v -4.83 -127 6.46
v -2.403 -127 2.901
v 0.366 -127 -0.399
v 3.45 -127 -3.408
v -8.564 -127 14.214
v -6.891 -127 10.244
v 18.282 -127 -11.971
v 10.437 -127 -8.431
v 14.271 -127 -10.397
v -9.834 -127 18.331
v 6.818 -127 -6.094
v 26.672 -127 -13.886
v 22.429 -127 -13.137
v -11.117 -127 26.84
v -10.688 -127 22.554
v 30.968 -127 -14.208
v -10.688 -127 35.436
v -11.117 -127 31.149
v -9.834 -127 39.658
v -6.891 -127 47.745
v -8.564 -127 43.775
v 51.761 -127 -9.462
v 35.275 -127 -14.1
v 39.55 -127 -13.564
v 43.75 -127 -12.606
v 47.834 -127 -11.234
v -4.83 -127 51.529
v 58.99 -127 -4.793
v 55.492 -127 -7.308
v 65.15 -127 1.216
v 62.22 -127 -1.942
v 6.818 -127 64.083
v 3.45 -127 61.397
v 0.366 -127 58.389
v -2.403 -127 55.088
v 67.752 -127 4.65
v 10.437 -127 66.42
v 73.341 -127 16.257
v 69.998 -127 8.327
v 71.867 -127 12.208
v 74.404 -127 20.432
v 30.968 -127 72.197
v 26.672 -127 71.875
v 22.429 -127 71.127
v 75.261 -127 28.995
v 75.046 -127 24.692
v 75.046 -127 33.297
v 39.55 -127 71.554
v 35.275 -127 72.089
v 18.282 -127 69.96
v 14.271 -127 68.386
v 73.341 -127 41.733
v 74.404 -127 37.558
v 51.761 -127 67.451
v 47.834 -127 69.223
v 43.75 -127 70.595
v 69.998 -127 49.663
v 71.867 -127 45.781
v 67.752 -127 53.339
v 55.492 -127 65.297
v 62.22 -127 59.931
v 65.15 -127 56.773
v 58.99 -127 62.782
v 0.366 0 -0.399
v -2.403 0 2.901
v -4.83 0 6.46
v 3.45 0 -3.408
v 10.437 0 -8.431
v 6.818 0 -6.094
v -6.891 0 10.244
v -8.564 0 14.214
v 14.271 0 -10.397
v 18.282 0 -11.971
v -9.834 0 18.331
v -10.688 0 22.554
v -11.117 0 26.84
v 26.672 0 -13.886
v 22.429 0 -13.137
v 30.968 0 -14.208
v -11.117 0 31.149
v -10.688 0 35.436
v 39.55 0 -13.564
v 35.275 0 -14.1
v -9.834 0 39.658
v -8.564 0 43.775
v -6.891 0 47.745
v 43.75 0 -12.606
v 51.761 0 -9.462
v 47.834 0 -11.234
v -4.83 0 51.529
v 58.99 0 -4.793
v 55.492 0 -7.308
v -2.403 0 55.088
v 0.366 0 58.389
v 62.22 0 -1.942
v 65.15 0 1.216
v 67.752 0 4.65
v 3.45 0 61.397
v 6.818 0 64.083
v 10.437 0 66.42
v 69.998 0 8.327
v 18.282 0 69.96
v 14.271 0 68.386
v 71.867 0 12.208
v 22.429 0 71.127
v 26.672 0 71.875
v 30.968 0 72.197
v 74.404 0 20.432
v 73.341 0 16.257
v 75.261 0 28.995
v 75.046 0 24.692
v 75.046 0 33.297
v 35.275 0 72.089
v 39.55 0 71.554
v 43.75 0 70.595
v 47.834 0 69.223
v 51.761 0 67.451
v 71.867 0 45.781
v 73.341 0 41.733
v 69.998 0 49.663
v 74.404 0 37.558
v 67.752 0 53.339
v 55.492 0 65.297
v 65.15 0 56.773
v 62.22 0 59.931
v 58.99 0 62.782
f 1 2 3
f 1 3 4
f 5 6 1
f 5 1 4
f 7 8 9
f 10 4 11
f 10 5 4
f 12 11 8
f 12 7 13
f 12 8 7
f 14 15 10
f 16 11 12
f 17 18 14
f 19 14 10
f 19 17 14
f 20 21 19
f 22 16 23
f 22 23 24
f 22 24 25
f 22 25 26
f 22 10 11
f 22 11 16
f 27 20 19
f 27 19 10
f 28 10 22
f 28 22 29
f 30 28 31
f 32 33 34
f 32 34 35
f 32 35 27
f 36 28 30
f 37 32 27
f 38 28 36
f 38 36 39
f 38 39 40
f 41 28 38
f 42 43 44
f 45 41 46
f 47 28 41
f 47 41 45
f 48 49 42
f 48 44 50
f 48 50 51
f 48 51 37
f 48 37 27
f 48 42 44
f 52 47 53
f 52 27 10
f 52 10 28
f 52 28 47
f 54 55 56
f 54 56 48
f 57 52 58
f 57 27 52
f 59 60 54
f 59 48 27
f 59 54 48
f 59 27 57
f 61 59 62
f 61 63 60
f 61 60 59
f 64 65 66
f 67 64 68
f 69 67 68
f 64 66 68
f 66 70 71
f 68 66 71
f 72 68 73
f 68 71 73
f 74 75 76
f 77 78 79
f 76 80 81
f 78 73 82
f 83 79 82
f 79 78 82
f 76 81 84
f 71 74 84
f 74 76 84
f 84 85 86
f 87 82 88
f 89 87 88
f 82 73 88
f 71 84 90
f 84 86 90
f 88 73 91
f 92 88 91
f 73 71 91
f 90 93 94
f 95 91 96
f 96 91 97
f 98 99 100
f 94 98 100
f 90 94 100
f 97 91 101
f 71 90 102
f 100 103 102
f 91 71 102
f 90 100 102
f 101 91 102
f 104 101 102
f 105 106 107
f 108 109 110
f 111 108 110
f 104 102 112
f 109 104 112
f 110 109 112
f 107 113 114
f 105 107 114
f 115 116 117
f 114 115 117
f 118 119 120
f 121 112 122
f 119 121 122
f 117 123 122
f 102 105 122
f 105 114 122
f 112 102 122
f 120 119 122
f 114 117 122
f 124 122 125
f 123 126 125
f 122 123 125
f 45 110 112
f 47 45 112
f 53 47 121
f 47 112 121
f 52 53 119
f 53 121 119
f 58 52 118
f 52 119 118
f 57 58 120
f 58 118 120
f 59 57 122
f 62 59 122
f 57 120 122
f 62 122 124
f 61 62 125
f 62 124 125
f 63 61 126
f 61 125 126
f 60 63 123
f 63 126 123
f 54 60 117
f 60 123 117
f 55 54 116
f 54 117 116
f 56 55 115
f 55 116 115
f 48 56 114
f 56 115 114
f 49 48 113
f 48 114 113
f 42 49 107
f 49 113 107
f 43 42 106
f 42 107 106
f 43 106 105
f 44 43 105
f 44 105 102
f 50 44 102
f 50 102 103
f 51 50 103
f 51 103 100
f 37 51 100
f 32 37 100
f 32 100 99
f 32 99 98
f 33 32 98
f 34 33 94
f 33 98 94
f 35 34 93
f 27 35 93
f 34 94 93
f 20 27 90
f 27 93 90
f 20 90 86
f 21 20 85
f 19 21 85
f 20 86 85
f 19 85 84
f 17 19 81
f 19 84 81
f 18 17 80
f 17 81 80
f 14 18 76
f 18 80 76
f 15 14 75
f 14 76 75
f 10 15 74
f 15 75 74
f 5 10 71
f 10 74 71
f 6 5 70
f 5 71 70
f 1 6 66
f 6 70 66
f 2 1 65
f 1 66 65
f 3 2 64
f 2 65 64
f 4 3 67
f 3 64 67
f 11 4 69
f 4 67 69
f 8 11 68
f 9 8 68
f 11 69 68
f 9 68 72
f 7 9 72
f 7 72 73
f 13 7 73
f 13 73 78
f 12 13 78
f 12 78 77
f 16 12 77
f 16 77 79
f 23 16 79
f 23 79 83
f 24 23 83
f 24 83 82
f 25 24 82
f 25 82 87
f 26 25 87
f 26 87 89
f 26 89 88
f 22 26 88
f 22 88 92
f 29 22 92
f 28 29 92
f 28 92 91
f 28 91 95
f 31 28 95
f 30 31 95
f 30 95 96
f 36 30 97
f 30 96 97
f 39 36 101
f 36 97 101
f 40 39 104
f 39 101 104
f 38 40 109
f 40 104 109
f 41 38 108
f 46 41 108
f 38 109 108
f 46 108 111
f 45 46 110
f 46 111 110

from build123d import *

# Parameters (mm, degrees)
F0_W      = 23.876
F0_H      = 22.352
F1_DEPTH  = 31.75
F2_R      = 0.796109
F3_DEPTH  = 25.4
F5_R      = 0.835635
F6_DEPTH  = 6.35
F7_R      = 0.804369
F4_W      = 23.876
F4_H      = 22.352
F4_R      = 0.796109
F8_DEPTH  = 6.35
F9_R      = 43.215518
F10_DEPTH = 127


with BuildPart() as f1:
    # F0 (on Top) → F1 (new body)
    with BuildSketch(Plane.XY):
        with Locations((11.938, -11.176)):
            Rectangle(F0_W, F0_H)
    extrude(amount=F1_DEPTH)

    # F2 (on face) → F3 (cut)
    with BuildSketch(Plane.XY.offset(31.75)):
        with Locations((22.537371, -1.488913)):
            Circle(F2_R)
    extrude(amount=-F3_DEPTH, mode=Mode.SUBTRACT)

    # F5 (on face) → F6 (cut)
    with BuildSketch(Plane.XY.offset(31.75)):
        with Locations((1.065723, -1.193718)):
            Circle(F5_R)
    extrude(amount=-F6_DEPTH, mode=Mode.SUBTRACT)

    # F7 (on face) + F4 (on face) → F8 (cut)
    with BuildSketch(Plane.XY.offset(31.75)):
        with Locations((1.000239, -21.275662)):
            Circle(F7_R)
    with BuildSketch(Plane.XY.offset(31.75)):
        with Locations((11.938, -11.176)):
            Rectangle(F4_W, F4_H)
        with Locations((22.537371, -1.488913)):
            Circle(F4_R, mode=Mode.SUBTRACT)
    extrude(amount=-F8_DEPTH, mode=Mode.SUBTRACT)

    # F9 (on Front) → F10 (join)
    with BuildSketch(Plane.XZ):
        with Locations((32.045215, 28.994571)):
            Circle(F9_R)
    extrude(amount=F10_DEPTH)


solid = f1.part
